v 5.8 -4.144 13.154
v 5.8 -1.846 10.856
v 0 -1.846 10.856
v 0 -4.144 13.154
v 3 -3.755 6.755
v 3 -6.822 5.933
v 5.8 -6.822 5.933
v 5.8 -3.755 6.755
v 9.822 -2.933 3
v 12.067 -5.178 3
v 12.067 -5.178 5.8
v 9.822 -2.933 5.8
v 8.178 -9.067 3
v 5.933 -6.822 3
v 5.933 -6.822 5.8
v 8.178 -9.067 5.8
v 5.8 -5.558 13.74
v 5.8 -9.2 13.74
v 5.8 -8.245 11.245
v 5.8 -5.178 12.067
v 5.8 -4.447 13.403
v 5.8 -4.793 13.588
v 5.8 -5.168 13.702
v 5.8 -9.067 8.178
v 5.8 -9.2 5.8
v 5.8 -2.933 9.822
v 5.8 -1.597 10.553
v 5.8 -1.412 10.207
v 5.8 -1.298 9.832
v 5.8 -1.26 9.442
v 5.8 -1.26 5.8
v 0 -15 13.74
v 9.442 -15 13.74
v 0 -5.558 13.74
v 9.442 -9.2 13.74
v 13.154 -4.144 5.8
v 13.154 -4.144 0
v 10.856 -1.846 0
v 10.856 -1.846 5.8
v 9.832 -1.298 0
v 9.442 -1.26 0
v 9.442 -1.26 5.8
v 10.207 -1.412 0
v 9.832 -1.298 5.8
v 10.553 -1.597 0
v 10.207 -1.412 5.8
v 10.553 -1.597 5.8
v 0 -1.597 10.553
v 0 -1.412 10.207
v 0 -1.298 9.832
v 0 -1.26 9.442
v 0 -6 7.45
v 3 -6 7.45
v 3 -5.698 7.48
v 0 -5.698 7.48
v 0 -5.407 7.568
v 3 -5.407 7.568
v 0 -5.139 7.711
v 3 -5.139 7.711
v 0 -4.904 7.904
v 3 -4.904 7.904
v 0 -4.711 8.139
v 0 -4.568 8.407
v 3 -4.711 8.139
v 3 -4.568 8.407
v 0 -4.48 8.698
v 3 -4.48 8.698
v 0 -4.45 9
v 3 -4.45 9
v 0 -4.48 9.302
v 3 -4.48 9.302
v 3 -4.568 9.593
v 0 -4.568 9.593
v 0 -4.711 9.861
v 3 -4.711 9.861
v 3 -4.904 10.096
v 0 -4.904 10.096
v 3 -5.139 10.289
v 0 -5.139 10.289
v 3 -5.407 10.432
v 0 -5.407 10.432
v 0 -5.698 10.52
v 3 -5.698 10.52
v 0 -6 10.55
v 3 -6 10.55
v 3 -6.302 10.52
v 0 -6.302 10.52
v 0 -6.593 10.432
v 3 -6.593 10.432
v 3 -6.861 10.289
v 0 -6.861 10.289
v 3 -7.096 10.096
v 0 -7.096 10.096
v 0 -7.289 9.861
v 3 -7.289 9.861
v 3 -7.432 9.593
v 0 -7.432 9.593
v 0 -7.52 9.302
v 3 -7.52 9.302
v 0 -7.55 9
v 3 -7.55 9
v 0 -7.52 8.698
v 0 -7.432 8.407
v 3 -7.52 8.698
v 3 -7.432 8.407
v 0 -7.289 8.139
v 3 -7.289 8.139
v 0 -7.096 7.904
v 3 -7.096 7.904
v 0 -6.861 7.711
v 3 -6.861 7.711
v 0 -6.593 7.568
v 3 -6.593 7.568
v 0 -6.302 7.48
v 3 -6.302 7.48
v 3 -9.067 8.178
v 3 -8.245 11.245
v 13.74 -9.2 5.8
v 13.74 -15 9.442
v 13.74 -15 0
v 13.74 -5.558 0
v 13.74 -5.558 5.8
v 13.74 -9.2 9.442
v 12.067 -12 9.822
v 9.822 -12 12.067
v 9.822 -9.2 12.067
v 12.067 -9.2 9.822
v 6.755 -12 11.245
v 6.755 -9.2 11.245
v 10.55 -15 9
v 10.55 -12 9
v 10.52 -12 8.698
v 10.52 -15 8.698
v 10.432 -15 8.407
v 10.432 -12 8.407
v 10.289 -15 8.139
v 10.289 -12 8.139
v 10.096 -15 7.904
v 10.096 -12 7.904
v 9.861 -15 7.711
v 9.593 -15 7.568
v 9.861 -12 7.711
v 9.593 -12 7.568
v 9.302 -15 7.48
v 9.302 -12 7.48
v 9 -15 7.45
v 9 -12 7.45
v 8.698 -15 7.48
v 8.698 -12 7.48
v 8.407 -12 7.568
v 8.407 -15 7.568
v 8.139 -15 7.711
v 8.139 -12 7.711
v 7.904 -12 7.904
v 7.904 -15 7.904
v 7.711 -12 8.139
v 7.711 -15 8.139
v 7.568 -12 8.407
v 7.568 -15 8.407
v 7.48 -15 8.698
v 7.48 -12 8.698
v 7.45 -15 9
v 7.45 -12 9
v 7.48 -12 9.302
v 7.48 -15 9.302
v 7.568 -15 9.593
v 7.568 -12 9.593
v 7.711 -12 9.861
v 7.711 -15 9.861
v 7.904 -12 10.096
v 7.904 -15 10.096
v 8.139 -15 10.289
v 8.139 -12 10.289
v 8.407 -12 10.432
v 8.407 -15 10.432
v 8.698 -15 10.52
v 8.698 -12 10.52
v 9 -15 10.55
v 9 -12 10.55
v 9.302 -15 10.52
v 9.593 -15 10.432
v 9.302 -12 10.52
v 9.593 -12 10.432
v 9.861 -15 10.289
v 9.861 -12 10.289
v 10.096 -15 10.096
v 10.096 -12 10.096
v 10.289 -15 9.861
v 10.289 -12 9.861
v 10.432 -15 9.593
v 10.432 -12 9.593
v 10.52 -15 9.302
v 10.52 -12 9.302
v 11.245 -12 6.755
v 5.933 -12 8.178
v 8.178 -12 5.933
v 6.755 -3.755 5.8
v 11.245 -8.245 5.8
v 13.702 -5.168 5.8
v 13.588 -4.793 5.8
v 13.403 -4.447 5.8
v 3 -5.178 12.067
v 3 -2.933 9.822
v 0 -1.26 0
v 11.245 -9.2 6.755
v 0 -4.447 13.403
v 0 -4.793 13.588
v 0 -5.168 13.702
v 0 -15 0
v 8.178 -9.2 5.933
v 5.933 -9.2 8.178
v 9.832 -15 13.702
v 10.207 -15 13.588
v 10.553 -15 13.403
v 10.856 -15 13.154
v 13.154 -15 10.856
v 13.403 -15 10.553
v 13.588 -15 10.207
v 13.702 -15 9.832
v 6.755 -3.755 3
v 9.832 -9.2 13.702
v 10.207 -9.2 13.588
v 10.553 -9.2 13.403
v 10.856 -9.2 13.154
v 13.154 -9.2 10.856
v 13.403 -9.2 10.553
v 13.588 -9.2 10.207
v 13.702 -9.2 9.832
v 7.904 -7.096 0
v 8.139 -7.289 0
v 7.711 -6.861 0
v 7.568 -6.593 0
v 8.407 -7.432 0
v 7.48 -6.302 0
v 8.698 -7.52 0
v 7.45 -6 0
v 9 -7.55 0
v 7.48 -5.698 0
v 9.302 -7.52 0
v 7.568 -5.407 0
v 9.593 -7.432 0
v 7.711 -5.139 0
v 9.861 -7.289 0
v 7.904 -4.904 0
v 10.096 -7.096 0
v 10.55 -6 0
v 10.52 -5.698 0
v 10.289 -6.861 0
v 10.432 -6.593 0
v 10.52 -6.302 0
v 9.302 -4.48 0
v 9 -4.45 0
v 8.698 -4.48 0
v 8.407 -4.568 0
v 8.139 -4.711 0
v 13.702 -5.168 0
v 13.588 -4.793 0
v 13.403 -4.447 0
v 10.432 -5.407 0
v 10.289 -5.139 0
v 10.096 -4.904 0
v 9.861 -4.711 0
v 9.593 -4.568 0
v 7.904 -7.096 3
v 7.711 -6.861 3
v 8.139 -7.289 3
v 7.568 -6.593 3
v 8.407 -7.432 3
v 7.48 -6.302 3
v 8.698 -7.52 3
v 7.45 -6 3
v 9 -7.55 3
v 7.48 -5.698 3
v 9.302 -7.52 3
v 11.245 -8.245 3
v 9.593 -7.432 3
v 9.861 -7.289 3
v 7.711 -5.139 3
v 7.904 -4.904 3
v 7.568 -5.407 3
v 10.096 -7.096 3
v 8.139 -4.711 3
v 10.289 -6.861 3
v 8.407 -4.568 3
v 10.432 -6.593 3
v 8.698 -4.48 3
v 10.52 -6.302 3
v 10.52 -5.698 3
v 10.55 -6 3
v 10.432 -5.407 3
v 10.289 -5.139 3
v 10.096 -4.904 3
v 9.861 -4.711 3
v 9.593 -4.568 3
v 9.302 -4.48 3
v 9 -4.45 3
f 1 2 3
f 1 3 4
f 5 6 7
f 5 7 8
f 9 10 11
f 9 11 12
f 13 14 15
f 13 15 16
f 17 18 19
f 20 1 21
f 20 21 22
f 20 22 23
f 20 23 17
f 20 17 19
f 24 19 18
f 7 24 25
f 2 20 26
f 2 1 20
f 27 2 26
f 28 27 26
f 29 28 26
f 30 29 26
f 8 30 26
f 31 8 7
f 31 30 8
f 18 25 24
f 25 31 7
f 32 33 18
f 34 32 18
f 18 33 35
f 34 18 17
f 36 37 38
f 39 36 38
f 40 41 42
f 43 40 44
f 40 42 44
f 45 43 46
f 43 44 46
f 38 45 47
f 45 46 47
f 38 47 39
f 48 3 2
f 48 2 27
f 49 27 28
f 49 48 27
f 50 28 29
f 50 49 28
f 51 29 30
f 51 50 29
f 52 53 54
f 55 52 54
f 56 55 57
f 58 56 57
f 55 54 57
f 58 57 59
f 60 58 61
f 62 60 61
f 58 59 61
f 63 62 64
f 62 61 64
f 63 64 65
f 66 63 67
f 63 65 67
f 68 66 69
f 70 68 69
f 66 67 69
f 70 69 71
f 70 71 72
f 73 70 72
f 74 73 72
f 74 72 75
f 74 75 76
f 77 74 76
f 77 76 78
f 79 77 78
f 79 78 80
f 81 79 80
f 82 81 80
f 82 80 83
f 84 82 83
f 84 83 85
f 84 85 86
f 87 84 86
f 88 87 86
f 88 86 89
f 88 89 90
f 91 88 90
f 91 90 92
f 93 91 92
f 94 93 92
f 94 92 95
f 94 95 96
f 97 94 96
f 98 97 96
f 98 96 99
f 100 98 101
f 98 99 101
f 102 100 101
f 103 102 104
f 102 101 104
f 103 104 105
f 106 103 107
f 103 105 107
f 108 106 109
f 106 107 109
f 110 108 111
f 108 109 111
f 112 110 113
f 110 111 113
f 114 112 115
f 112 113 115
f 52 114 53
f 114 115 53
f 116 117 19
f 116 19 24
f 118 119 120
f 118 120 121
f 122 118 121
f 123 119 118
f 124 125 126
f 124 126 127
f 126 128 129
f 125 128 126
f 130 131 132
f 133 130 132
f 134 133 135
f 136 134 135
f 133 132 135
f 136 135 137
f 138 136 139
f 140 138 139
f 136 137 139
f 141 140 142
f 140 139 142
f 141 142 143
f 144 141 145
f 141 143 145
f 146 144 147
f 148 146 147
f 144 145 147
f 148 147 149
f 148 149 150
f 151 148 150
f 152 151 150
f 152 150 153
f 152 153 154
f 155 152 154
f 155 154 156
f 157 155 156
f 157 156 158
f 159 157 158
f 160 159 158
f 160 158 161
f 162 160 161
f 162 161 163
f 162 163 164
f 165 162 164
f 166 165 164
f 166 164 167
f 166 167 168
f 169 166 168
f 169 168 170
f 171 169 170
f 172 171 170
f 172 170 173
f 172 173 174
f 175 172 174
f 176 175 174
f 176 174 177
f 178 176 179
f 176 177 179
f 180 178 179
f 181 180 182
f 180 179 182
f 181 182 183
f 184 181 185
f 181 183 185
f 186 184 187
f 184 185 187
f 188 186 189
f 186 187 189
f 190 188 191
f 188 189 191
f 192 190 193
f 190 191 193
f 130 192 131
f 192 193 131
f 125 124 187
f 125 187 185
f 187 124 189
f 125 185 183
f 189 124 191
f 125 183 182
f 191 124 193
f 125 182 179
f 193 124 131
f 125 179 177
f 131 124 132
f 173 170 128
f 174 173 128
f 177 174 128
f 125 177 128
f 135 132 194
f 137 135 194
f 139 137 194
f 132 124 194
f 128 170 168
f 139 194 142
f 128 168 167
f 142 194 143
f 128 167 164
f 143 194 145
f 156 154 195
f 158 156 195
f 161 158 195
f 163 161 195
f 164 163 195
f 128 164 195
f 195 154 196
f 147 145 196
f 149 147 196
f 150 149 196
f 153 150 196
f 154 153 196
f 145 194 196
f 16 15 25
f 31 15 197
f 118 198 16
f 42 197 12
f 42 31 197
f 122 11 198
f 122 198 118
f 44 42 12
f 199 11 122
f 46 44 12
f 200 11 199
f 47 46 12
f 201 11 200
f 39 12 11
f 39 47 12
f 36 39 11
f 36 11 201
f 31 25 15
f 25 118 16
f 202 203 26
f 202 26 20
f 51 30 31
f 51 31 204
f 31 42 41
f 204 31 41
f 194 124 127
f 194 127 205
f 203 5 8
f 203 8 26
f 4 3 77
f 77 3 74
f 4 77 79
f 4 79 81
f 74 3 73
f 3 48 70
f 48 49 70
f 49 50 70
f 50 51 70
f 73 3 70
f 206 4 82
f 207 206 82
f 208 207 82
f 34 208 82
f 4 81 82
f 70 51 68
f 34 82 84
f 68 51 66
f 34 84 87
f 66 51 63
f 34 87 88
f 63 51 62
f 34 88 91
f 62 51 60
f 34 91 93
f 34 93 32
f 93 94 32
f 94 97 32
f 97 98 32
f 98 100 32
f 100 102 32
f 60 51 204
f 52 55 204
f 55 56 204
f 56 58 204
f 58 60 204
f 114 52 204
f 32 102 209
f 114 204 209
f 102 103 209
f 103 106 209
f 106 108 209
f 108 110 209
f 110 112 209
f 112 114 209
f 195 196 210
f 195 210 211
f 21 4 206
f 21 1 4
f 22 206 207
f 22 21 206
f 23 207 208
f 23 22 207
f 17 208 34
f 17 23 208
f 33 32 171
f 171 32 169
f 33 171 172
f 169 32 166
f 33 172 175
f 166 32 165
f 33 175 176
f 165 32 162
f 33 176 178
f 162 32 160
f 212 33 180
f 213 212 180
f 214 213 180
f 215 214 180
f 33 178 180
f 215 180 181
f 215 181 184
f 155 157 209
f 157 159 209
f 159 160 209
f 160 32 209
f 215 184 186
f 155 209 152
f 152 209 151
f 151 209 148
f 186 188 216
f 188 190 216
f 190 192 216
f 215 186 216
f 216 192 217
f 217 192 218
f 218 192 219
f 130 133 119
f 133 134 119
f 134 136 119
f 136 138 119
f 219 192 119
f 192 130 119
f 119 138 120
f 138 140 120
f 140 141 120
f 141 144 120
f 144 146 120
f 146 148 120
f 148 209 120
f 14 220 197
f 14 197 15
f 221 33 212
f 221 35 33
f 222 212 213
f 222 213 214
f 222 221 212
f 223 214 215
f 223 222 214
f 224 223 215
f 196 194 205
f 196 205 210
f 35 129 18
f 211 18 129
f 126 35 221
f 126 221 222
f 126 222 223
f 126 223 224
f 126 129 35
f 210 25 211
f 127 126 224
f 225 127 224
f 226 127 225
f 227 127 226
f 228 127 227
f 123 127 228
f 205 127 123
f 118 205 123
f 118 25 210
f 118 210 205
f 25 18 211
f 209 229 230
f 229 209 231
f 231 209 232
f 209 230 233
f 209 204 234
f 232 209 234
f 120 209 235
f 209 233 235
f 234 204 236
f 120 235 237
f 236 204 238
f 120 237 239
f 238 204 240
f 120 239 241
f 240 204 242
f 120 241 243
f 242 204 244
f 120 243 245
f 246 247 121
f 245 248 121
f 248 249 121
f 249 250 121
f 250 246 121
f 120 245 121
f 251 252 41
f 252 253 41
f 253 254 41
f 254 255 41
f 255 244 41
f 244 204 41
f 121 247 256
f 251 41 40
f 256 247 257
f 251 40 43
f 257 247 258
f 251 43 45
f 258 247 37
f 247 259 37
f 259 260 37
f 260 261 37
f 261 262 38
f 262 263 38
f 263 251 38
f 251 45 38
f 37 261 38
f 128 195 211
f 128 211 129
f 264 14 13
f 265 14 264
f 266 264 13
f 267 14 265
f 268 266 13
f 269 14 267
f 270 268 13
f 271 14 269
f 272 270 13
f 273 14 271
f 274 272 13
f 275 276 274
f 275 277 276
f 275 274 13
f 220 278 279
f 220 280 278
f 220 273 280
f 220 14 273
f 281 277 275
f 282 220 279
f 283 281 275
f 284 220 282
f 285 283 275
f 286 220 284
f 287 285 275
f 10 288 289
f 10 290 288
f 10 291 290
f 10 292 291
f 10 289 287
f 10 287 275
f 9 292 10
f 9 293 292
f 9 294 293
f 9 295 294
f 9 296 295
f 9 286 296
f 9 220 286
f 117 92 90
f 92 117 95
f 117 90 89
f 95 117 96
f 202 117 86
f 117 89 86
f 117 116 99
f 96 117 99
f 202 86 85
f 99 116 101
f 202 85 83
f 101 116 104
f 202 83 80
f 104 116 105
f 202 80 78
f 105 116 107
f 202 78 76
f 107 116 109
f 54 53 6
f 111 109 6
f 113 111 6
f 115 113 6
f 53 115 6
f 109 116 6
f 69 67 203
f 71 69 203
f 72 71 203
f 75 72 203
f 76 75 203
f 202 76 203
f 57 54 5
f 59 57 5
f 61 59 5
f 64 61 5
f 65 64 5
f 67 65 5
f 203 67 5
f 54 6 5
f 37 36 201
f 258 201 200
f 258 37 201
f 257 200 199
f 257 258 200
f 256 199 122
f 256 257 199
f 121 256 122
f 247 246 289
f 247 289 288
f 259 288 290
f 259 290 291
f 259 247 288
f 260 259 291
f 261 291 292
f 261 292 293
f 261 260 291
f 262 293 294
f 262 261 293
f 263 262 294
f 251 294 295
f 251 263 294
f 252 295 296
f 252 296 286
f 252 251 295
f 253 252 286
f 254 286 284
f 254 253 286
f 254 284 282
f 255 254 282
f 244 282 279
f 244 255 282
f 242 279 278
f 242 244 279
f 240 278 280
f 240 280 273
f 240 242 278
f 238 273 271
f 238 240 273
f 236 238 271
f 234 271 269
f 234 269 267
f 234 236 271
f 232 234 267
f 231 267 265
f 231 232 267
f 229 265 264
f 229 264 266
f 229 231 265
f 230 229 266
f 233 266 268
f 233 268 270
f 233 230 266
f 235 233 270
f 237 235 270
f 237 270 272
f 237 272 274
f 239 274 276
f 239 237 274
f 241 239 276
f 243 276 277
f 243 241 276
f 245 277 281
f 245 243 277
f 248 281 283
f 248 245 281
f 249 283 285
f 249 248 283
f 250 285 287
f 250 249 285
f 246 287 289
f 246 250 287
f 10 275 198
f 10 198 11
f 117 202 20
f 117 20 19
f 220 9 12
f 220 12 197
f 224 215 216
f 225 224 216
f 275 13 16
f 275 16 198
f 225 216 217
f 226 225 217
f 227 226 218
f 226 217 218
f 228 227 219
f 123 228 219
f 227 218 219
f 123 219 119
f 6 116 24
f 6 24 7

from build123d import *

# Parameters (mm, degrees)
IZIM1_W                     = 15
IZIM1_H                     = 15
IZIM1_R                     = 1.55
Y_KSEKLIK_EKSTR_ZYON1_DEPTH = 3
Y_KSEKLIK_EKSTR_ZYON2_DEPTH = 12
IZIM3_R                     = 1.55
KES_EKSTR_ZYON1_DEPTH       = 4
IZIM4_R                     = 1.55
KES_EKSTR_ZYON2_DEPTH       = 4
Y_KSEKLIK_EKSTR_ZYON3_DEPTH = 2.8
Y_KSEKLIK_EKSTR_ZYON4_DEPTH = 2.8
Y_KSEKLIK_EKSTR_ZYON5_DEPTH = 2.8
KES_EKSTR_ZYON3_DEPTH       = 3
KES_EKSTR_ZYON4_DEPTH       = 3
KES_EKSTR_ZYON5_DEPTH       = 3
IZIM13_W                    = 2.049280952
IZIM13_H                    = 12.849743754
KES_EKSTR_ZYON6_DEPTH       = 16
IZIM14_W                    = 1.259740945
IZIM14_H                    = 10.270148586
KES_EKSTR_ZYON7_DEPTH       = 16
IZIM15_W                    = 10.270148586
IZIM15_H                    = 1.259740945
KES_EKSTR_ZYON8_DEPTH       = 16
RADYUS1_R                   = 2


with BuildPart() as part:
    # Çizim1 → Yükseklik-Ekstrüzyon1 (new body)
    with BuildSketch(Plane.XY):
        with Locations((7.5, -7.5)):
            Rectangle(IZIM1_W, IZIM1_H)
        with Locations((9, -6)):
            Circle(IZIM1_R, mode=Mode.SUBTRACT)
    extrude(amount=Y_KSEKLIK_EKSTR_ZYON1_DEPTH)

    # Çizim2 → Yükseklik-Ekstrüzyon2 (add)
    with BuildSketch(Plane.XY.offset(3)):
        Polygon((0, 0), (0, -15), (15, -15), (15, -12), (3, -12), (3, 0), align=None)
    extrude(amount=Y_KSEKLIK_EKSTR_ZYON2_DEPTH)

    # Çizim3 → Kes-Ekstrüzyon1 (cut, through all)
    with BuildSketch(Plane(origin=(0, -12, 0), x_dir=(1, 0, 0), z_dir=(0, 1, 0))):
        with Locations((9, -9)):
            Circle(IZIM3_R)
    extrude(amount=-KES_EKSTR_ZYON1_DEPTH, mode=Mode.SUBTRACT)

    # Çizim4 → Kes-Ekstrüzyon2 (cut, through all)
    with BuildSketch(Plane(origin=(3, 0, 0), x_dir=(0, 0, -1), z_dir=(1, 0, 0))):
        with Locations((-9, -6)):
            Circle(IZIM4_R)
    extrude(amount=-KES_EKSTR_ZYON2_DEPTH, mode=Mode.SUBTRACT)

    # Çizim5 → Yükseklik-Ekstrüzyon3 (add)
    with BuildSketch(Plane.XY.offset(3)):
        Polygon((13.740259055, -4.729851414), (10.270148586, -1.259740945), (3, -1.259740945), (3, -12), (13.740259055, -12), align=None)
        Polygon((12.067226447, -5.178139151), (9.821860849, -2.932773553), (6.754634402, -3.754634402), (5.932773553, -6.821860849), (8.178139151, -9.067226447), (11.245365598, -8.245365598), align=None, mode=Mode.SUBTRACT)
    extrude(amount=Y_KSEKLIK_EKSTR_ZYON3_DEPTH)

    # Çizim6 → Yükseklik-Ekstrüzyon4 (add)
    with BuildSketch(Plane(origin=(0, -12, 0), x_dir=(1, 0, 0), z_dir=(0, 1, 0))):
        Polygon((10.270148586, -13.740259055), (13.740259055, -10.270148586), (13.740259055, -3), (3, -3), (3, -13.740259055), (5.529889531, -13.740259055), align=None)
        Polygon((12.067226447, -9.821860849), (11.245365598, -6.754634402), (8.178139151, -5.932773553), (5.932773553, -8.178139151), (6.754634402, -11.245365598), (9.821860849, -12.067226447), align=None, mode=Mode.SUBTRACT)
    extrude(amount=Y_KSEKLIK_EKSTR_ZYON4_DEPTH)

    # Çizim7 → Yükseklik-Ekstrüzyon5 (add)
    with BuildSketch(Plane(origin=(3, 0, 0), x_dir=(0, 0, -1), z_dir=(1, 0, 0))):
        Polygon((-10.270148586, -1.259740945), (-13.740259055, -4.729851414), (-13.740259055, -12), (-3, -12), (-3, -1.259740945), align=None)
        Polygon((-11.245365598, -8.245365598), (-8.178139151, -9.067226447), (-5.932773553, -6.821860849), (-6.754634402, -3.754634402), (-9.821860849, -2.932773553), (-12.067226447, -5.178139151), align=None, mode=Mode.SUBTRACT)
    extrude(amount=Y_KSEKLIK_EKSTR_ZYON5_DEPTH)

    # Çizim9 → Kes-Ekstrüzyon3 (cut)
    with BuildSketch(Plane.XY.offset(3)):
        Polygon((9.01040764, 0), (15, -5.98959236), (15, 0), align=None)
    extrude(amount=-KES_EKSTR_ZYON3_DEPTH, mode=Mode.SUBTRACT)

    # Çizim10 → Kes-Ekstrüzyon4 (cut)
    with BuildSketch(Plane(origin=(0, -12, 0), x_dir=(1, 0, 0), z_dir=(0, 1, 0))):
        Polygon((15, -9.01040764), (9.01040764, -15), (15, -15), align=None)
    extrude(amount=-KES_EKSTR_ZYON4_DEPTH, mode=Mode.SUBTRACT)

    # Çizim11 → Kes-Ekstrüzyon5 (cut)
    with BuildSketch(Plane(origin=(3, 0, 0), x_dir=(0, 0, -1), z_dir=(1, 0, 0))):
        Polygon((-9.01040764, 0), (-15, -5.98959236), (-15, 0), align=None)
    extrude(amount=-KES_EKSTR_ZYON5_DEPTH, mode=Mode.SUBTRACT)

    # Çizim13 → Kes-Ekstrüzyon6 (cut)
    with BuildSketch(Plane(origin=(15, 0, 0), x_dir=(0, 0, -1), z_dir=(1, 0, 0))):
        with Locations((-14.764899531, -9.373013496)):
            Rectangle(IZIM13_W, IZIM13_H)
    extrude(amount=-KES_EKSTR_ZYON6_DEPTH, mode=Mode.SUBTRACT)

    # Çizim14 → Kes-Ekstrüzyon7 (cut)
    with BuildSketch(Plane.XY.offset(13.740259055)):
        with Locations((14.370129528, -9.864925707)):
            Rectangle(IZIM14_W, IZIM14_H)
    extrude(amount=-KES_EKSTR_ZYON7_DEPTH, mode=Mode.SUBTRACT)

    # Çizim15 → Kes-Ekstrüzyon8 (cut)
    with BuildSketch(Plane(origin=(13.740259055, 0, 0), x_dir=(0, 0, -1), z_dir=(1, 0, 0))):
        with Locations((-5.135074293, -0.629870473)):
            Rectangle(IZIM15_W, IZIM15_H)
    extrude(amount=-KES_EKSTR_ZYON8_DEPTH, mode=Mode.SUBTRACT)

    # Radyus1
    radyus1_edges = [part.edges().sort_by_distance(p)[0] for p in [
        (2.9, -4.729851414, 13.740259055),
        (2.9, -1.259740945, 10.270148586),
        (13.740259055, -4.729851414, 2.9),
        (10.270148586, -1.259740945, 2.9),
        (13.740259055, -12.1, 10.270148586),
        (10.270148586, -12.1, 13.740259055),
    ]]
    fillet(radyus1_edges, radius=RADYUS1_R)


solid = part.part
